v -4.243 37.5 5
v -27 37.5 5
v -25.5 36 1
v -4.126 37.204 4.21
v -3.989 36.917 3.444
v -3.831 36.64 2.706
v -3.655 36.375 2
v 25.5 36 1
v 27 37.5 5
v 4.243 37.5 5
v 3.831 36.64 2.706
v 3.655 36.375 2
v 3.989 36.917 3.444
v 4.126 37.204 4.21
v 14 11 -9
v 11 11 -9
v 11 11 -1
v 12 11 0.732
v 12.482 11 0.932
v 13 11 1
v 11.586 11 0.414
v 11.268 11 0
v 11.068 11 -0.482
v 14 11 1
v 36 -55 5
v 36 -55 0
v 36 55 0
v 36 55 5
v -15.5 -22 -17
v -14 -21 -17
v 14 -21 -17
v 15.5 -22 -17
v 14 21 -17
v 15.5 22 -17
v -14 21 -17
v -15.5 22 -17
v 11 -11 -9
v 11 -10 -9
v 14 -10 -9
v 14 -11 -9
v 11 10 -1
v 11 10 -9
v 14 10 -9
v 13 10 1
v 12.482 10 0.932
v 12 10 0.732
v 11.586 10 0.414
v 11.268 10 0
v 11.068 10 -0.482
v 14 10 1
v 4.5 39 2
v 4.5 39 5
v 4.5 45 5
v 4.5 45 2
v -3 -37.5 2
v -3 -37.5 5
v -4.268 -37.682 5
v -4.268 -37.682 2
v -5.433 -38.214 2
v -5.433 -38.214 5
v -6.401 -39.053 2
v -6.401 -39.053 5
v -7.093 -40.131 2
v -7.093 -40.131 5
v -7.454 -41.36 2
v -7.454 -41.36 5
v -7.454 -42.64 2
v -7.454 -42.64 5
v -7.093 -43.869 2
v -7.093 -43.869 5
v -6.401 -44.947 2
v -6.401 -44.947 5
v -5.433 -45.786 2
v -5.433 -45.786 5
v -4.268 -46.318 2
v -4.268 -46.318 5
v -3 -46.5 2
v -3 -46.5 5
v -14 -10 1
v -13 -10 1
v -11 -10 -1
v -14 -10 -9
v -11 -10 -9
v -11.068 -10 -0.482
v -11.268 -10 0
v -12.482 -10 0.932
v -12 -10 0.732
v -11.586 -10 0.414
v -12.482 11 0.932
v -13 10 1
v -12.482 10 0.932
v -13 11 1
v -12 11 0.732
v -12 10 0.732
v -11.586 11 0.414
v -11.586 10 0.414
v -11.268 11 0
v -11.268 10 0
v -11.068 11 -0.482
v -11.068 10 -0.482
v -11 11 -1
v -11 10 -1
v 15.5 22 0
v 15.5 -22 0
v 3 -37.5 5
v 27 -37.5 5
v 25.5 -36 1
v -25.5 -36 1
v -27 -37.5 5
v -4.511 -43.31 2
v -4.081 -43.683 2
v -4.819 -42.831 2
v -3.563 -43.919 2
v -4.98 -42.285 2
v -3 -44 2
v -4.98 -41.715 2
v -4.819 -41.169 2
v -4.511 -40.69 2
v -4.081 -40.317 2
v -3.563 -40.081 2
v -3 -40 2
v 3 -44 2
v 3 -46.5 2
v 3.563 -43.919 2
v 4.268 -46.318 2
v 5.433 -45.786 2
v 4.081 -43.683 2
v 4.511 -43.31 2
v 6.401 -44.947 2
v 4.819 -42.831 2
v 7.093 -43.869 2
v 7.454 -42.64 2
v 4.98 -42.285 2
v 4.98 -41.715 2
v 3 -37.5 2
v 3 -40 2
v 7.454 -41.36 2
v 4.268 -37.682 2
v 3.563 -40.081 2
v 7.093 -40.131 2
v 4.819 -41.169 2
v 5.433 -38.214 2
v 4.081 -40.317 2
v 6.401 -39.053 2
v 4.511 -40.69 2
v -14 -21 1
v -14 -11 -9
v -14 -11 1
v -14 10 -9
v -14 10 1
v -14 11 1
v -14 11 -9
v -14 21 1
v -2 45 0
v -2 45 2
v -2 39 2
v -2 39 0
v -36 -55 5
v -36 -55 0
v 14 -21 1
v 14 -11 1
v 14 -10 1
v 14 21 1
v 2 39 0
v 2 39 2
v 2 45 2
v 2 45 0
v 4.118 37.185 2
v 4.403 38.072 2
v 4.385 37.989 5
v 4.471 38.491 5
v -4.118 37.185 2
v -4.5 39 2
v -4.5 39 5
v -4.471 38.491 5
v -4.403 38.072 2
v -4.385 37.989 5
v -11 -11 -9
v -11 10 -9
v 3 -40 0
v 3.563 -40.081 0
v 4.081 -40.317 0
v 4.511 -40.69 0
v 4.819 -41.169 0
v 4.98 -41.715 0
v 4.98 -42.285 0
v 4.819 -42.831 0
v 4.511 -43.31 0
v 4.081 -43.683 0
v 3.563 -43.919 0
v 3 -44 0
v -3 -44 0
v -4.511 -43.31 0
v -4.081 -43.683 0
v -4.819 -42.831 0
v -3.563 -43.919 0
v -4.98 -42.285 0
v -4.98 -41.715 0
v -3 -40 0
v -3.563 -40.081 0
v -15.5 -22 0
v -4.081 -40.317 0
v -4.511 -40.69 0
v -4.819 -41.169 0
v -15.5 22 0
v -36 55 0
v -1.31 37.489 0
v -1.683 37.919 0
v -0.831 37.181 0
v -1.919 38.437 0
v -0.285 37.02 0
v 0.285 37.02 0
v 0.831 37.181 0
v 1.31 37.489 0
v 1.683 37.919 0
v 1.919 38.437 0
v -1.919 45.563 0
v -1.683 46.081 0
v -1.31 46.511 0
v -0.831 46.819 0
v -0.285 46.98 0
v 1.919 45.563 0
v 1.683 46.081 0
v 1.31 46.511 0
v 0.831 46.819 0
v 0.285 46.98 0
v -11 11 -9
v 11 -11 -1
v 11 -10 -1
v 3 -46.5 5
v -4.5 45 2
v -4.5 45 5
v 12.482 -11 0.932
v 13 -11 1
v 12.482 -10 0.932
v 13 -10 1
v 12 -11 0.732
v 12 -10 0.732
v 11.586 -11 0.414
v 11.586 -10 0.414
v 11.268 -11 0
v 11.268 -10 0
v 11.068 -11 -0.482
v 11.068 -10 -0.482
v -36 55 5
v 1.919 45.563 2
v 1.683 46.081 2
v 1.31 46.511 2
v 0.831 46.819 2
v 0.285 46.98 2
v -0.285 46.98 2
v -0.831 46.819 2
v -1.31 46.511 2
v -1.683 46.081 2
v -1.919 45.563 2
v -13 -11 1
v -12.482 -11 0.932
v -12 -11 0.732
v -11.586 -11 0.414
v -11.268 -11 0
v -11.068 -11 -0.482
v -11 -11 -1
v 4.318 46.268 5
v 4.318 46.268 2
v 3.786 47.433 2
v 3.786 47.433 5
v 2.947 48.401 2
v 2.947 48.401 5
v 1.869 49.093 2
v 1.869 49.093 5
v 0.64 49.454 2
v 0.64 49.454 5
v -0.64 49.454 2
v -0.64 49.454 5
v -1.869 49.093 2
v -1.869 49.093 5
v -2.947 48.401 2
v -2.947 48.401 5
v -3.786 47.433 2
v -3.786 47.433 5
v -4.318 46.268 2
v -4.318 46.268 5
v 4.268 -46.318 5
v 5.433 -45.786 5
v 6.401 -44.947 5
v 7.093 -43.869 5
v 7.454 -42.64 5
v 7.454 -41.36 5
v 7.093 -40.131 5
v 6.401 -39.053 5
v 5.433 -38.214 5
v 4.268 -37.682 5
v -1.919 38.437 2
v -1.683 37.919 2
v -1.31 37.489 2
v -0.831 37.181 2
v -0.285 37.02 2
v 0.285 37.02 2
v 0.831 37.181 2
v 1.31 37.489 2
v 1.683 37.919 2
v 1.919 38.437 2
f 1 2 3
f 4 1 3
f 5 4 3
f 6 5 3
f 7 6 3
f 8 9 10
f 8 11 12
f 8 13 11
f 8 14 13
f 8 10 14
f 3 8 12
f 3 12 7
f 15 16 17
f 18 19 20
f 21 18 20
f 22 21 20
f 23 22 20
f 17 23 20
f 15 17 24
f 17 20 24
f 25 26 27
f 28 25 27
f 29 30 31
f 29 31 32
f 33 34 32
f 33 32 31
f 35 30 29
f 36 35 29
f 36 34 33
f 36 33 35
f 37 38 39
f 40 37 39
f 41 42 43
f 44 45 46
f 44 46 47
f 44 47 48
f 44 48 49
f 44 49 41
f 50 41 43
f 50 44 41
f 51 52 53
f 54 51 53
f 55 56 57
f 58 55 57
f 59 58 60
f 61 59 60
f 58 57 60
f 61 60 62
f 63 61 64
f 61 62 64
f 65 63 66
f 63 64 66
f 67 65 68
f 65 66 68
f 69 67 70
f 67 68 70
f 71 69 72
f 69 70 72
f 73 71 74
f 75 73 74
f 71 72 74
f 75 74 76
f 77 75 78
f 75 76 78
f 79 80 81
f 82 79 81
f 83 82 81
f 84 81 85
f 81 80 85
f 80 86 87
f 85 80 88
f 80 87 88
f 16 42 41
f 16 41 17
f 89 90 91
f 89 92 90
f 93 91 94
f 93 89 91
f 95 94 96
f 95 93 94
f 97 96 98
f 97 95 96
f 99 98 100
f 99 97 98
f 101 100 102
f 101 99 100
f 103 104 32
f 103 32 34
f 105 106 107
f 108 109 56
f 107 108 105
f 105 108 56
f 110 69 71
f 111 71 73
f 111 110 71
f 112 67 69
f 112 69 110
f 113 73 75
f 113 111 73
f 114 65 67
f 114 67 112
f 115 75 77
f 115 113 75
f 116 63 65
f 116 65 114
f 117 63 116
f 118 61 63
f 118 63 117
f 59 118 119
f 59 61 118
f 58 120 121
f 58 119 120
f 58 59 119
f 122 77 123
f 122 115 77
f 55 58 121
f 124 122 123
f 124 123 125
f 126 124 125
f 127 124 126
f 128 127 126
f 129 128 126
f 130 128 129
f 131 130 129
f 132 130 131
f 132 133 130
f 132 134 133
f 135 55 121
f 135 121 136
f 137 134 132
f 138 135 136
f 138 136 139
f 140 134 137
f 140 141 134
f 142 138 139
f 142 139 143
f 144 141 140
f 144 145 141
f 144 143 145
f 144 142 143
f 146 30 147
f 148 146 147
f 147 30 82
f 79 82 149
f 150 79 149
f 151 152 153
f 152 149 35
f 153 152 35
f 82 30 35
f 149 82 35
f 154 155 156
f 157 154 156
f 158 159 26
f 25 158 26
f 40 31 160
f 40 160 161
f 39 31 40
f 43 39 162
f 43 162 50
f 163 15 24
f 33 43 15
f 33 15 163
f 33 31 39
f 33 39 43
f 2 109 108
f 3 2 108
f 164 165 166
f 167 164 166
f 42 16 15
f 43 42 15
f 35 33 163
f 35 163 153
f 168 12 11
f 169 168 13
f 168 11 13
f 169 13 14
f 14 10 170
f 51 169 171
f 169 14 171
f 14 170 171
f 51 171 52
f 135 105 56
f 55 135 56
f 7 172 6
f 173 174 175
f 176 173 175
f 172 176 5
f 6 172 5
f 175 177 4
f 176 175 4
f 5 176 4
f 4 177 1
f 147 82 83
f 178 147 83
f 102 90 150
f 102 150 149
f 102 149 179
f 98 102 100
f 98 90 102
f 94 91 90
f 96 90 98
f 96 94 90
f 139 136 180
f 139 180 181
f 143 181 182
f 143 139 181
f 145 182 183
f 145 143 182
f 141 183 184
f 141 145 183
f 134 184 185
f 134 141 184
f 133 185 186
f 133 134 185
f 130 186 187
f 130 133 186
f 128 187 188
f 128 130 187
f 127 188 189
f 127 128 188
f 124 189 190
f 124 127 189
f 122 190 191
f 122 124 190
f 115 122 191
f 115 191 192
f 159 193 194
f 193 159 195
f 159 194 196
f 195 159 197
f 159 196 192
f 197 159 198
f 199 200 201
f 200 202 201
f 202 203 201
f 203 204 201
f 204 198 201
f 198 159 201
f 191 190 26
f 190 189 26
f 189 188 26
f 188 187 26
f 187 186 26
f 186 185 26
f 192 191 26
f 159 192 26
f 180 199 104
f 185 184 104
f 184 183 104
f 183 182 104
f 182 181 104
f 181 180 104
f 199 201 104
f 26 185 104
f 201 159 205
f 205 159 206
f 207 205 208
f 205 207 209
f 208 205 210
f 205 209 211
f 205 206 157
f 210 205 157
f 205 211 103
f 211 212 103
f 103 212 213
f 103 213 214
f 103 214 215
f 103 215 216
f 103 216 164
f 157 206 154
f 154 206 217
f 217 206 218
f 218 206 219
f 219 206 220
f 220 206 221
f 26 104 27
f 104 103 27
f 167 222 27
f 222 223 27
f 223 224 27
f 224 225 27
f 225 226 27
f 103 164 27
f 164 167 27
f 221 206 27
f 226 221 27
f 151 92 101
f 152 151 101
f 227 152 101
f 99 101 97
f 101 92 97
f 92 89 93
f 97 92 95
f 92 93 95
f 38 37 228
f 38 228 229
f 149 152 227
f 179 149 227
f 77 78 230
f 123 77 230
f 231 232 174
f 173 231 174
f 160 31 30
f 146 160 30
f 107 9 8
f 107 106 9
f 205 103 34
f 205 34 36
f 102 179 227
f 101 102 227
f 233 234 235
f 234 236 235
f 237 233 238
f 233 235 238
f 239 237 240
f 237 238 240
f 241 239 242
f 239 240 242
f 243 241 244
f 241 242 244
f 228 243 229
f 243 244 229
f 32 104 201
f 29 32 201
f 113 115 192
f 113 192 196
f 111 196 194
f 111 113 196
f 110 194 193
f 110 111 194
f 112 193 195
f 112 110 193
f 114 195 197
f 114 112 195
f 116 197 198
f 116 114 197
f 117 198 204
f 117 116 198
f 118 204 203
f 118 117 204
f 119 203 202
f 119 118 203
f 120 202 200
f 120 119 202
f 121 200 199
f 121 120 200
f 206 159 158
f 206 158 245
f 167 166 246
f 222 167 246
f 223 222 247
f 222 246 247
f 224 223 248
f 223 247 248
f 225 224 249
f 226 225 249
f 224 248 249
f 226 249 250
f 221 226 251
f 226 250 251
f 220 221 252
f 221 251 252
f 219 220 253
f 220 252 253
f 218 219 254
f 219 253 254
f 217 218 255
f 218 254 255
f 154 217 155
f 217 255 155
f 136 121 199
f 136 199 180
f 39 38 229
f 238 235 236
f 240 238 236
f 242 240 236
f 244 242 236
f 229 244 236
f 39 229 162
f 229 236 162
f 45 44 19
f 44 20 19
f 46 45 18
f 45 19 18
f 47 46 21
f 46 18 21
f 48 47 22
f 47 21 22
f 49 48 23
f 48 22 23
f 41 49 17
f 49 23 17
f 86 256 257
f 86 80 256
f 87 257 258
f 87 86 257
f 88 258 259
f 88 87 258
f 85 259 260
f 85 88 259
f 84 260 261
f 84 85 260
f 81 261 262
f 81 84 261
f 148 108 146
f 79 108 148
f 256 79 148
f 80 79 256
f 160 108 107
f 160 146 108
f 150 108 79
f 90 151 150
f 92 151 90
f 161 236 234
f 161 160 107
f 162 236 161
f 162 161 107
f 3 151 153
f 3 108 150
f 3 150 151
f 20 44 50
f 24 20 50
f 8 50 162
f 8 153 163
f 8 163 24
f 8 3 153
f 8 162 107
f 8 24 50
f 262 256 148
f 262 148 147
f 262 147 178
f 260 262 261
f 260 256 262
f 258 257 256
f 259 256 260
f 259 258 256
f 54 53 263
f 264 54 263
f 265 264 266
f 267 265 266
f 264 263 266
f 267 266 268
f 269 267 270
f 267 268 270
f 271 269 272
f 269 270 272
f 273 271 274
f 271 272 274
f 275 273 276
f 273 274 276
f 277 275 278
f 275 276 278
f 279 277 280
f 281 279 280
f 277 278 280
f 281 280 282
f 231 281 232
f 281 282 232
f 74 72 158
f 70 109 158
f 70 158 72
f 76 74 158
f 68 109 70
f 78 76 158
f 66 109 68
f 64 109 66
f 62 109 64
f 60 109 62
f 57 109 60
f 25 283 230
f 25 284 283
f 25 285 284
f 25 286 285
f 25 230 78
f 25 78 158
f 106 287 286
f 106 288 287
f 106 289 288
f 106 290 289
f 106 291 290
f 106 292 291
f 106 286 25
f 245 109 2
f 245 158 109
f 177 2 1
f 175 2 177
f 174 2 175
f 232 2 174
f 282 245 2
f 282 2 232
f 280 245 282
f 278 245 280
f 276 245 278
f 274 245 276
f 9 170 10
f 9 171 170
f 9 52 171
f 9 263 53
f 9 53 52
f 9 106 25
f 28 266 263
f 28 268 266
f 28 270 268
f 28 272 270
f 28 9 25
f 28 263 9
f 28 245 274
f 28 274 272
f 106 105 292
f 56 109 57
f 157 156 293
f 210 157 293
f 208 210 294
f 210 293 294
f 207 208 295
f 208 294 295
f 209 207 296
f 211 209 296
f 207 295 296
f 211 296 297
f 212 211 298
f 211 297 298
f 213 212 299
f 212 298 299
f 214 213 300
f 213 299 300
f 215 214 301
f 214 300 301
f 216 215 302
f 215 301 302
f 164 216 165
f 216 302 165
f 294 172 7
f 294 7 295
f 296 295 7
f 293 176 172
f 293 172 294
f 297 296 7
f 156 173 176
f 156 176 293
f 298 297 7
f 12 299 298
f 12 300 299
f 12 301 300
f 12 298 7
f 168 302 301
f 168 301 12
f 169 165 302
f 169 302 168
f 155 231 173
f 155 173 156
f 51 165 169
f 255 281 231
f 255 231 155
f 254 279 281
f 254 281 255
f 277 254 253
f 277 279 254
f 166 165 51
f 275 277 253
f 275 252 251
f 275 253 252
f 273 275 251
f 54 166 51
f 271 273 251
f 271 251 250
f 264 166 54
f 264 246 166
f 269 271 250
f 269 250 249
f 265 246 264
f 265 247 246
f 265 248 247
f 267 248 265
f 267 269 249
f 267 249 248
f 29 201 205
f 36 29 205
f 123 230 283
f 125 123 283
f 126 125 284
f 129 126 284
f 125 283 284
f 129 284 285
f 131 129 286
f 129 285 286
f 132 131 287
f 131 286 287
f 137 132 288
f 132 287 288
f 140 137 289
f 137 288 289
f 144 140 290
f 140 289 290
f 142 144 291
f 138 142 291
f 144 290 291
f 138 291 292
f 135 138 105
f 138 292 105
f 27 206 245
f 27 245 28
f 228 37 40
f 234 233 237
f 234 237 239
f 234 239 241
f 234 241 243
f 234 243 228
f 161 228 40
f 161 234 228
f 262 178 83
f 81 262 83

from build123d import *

# Parameters (mm, degrees)
ESBO_O1_W                = 72
ESBO_O1_H                = 110
RESSALTO_EXTRUS_O1_DEPTH = 5
ESBO_O2_W                = 51
ESBO_O2_H                = 72
CORTE_EXTRUS_O1_DEPTH    = 4
CHANFRO1_SIZE            = 1.5
CHANFRO1_SIZE_2          = 4
CORTE_EXTRUS_O2_DEPTH    = 66.924198895
CORTE_EXTRUS_O3_DEPTH    = 66.924198895
CORTE_EXTRUS_O4_DEPTH    = 3
CORTE_EXTRUS_O5_DEPTH    = 3
ESBO_O7_W                = 31
ESBO_O7_H                = 44
RESSALTO_EXTRUS_O2_DEPTH = 17
ESBO_O8_W                = 28
ESBO_O8_H                = 42
CORTE_EXTRUS_O6_DEPTH    = 70.318107302
ESBO_O9_W                = 3
ESBO_O9_H                = 1
RESSALTO_EXTRUS_O3_DEPTH = 10
FILETE1_R                = 2


with BuildPart() as part:
    # Esboço1 → Ressalto-extrusão1 (new body)
    with BuildSketch(Plane.XY):
        Rectangle(ESBO_O1_W, ESBO_O1_H)
    extrude(amount=RESSALTO_EXTRUS_O1_DEPTH)

    # Esboço2 → Corte-extrusão1 (cut)
    with BuildSketch(Plane.XY.offset(5)):
        Rectangle(ESBO_O2_W, ESBO_O2_H)
    extrude(amount=-CORTE_EXTRUS_O1_DEPTH, mode=Mode.SUBTRACT)

    # Chanfro1
    # the kernel refuses this chamfer: 4, 1.5 mm, written as the material it takes off along each edge
    with BuildSketch(Plane(origin=(-25.5, -36, 5), x_dir=(0, -0.9953980532473654, 0.09582648689874358), z_dir=(1, 0, 0))) as chanfro1_piece_1_section:
        Polygon((CHANFRO1_SIZE * 0.995398053247, CHANFRO1_SIZE * 0.0958264868987), (-CHANFRO1_SIZE_2 * 0.0958264868987, CHANFRO1_SIZE_2 * 0.995398053247), (0, 0), align=None)
    chanfro1_piece_1 = extrude(amount=51, mode=Mode.PRIVATE)
    chanfro1_piece_1 = split(chanfro1_piece_1, bisect_by=Plane(origin=(0, -36.465264147, 1), z_dir=(0, 0, 1)), keep=Keep.TOP, mode=Mode.PRIVATE)
    add(chanfro1_piece_1, mode=Mode.SUBTRACT)
    with BuildSketch(Plane(origin=(-25.5, 36, 5), x_dir=(-0.9953980532473654, 0, 0.09582648689874379), z_dir=(0, -1, 0))) as chanfro1_piece_2_section:
        Polygon((CHANFRO1_SIZE * 0.995398053247, CHANFRO1_SIZE * 0.0958264868987), (-CHANFRO1_SIZE_2 * 0.0958264868987, CHANFRO1_SIZE_2 * 0.995398053247), (0, 0), align=None)
    chanfro1_piece_2 = extrude(amount=72, mode=Mode.PRIVATE)
    chanfro1_piece_2 = split(chanfro1_piece_2, bisect_by=Plane(origin=(-25.965264147, 0, 1), z_dir=(0, 0, 1)), keep=Keep.TOP, mode=Mode.PRIVATE)
    add(chanfro1_piece_2, mode=Mode.SUBTRACT)
    with BuildSketch(Plane(origin=(25.5, -36, 5), x_dir=(0.9953980532473654, 0, 0.09582648689874379), z_dir=(0, 1, 0))) as chanfro1_piece_3_section:
        Polygon((CHANFRO1_SIZE * 0.995398053247, CHANFRO1_SIZE * 0.0958264868987), (-CHANFRO1_SIZE_2 * 0.0958264868987, CHANFRO1_SIZE_2 * 0.995398053247), (0, 0), align=None)
    chanfro1_piece_3 = extrude(amount=72, mode=Mode.PRIVATE)
    chanfro1_piece_3 = split(chanfro1_piece_3, bisect_by=Plane(origin=(25.965264147, 0, 1), z_dir=(0, 0, 1)), keep=Keep.TOP, mode=Mode.PRIVATE)
    add(chanfro1_piece_3, mode=Mode.SUBTRACT)
    with BuildSketch(Plane(origin=(25.5, 36, 5), x_dir=(0, 0.9953980532473654, 0.09582648689874358), z_dir=(-1, 0, 0))) as chanfro1_piece_4_section:
        Polygon((CHANFRO1_SIZE * 0.995398053247, CHANFRO1_SIZE * 0.0958264868987), (-CHANFRO1_SIZE_2 * 0.0958264868987, CHANFRO1_SIZE_2 * 0.995398053247), (0, 0), align=None)
    chanfro1_piece_4 = extrude(amount=51, mode=Mode.PRIVATE)
    chanfro1_piece_4 = split(chanfro1_piece_4, bisect_by=Plane(origin=(0, 36.465264147, 1), z_dir=(0, 0, 1)), keep=Keep.TOP, mode=Mode.PRIVATE)
    add(chanfro1_piece_4, mode=Mode.SUBTRACT)
    with BuildSketch(Plane(origin=(-35.875482322, -36, 5), x_dir=(0, -0.9953980532473654, 0.09582648689874358), z_dir=(1, 0, 0))) as chanfro1_piece_5a_section:
        Polygon((CHANFRO1_SIZE * 0.995398053247, CHANFRO1_SIZE * 0.0958264868987), (-CHANFRO1_SIZE_2 * 0.0958264868987, CHANFRO1_SIZE_2 * 0.995398053247), (0, 0), align=None)
    chanfro1_piece_5a = extrude(amount=61.375482322, mode=Mode.PRIVATE)
    chanfro1_piece_5a = split(chanfro1_piece_5a, bisect_by=Plane(origin=(-25.5, -36.465264147, 3.645492171), z_dir=(-1, 0, 0)), keep=Keep.TOP, mode=Mode.PRIVATE)
    chanfro1_piece_5a = split(chanfro1_piece_5a, bisect_by=Plane(origin=(-30.687741161, -36.465264147, 1), z_dir=(0, 0, 1)), keep=Keep.TOP, mode=Mode.PRIVATE)
    with BuildSketch(Plane(origin=(-25.5, 36, 5), x_dir=(-0.9953980532473654, 0, 0.09582648689874379), z_dir=(0, -1, 0))) as chanfro1_piece_5b_section:
        Polygon((CHANFRO1_SIZE * 0.995398053247, CHANFRO1_SIZE * 0.0958264868987), (-CHANFRO1_SIZE_2 * 0.0958264868987, CHANFRO1_SIZE_2 * 0.995398053247), (0, 0), align=None)
    chanfro1_piece_5b = extrude(amount=82.375482322, mode=Mode.PRIVATE)
    chanfro1_piece_5b = split(chanfro1_piece_5b, bisect_by=Plane(origin=(-25.965264147, -36, 3.645492171), z_dir=(0, -1, 0)), keep=Keep.TOP, mode=Mode.PRIVATE)
    chanfro1_piece_5b = split(chanfro1_piece_5b, bisect_by=Plane(origin=(-25.965264147, -41.187741161, 1), z_dir=(0, 0, 1)), keep=Keep.TOP, mode=Mode.PRIVATE)
    chanfro1_piece_5 = chanfro1_piece_5a & chanfro1_piece_5b
    add(chanfro1_piece_5, mode=Mode.SUBTRACT)
    with BuildSketch(Plane(origin=(-25.5, -36, 5), x_dir=(0, -0.9953980532473654, 0.09582648689874358), z_dir=(1, 0, 0))) as chanfro1_piece_6a_section:
        Polygon((CHANFRO1_SIZE * 0.995398053247, CHANFRO1_SIZE * 0.0958264868987), (-CHANFRO1_SIZE_2 * 0.0958264868987, CHANFRO1_SIZE_2 * 0.995398053247), (0, 0), align=None)
    chanfro1_piece_6a = extrude(amount=61.375482322, mode=Mode.PRIVATE)
    chanfro1_piece_6a = split(chanfro1_piece_6a, bisect_by=Plane(origin=(25.5, -36.465264147, 3.645492171), z_dir=(1, 0, 0)), keep=Keep.TOP, mode=Mode.PRIVATE)
    chanfro1_piece_6a = split(chanfro1_piece_6a, bisect_by=Plane(origin=(30.687741161, -36.465264147, 1), z_dir=(0, 0, 1)), keep=Keep.TOP, mode=Mode.PRIVATE)
    with BuildSketch(Plane(origin=(25.5, -46.375482322, 5), x_dir=(0.9953980532473654, 0, 0.09582648689874379), z_dir=(0, 1, 0))) as chanfro1_piece_6b_section:
        Polygon((CHANFRO1_SIZE * 0.995398053247, CHANFRO1_SIZE * 0.0958264868987), (-CHANFRO1_SIZE_2 * 0.0958264868987, CHANFRO1_SIZE_2 * 0.995398053247), (0, 0), align=None)
    chanfro1_piece_6b = extrude(amount=82.375482322, mode=Mode.PRIVATE)
    chanfro1_piece_6b = split(chanfro1_piece_6b, bisect_by=Plane(origin=(25.965264147, -36, 3.645492171), z_dir=(0, -1, 0)), keep=Keep.TOP, mode=Mode.PRIVATE)
    chanfro1_piece_6b = split(chanfro1_piece_6b, bisect_by=Plane(origin=(25.965264147, -41.187741161, 1), z_dir=(0, 0, 1)), keep=Keep.TOP, mode=Mode.PRIVATE)
    chanfro1_piece_6 = chanfro1_piece_6a & chanfro1_piece_6b
    add(chanfro1_piece_6, mode=Mode.SUBTRACT)
    with BuildSketch(Plane(origin=(25.5, 36, 5), x_dir=(0, 0.9953980532473654, 0.09582648689874358), z_dir=(-1, 0, 0))) as chanfro1_piece_7a_section:
        Polygon((CHANFRO1_SIZE * 0.995398053247, CHANFRO1_SIZE * 0.0958264868987), (-CHANFRO1_SIZE_2 * 0.0958264868987, CHANFRO1_SIZE_2 * 0.995398053247), (0, 0), align=None)
    chanfro1_piece_7a = extrude(amount=61.375482322, mode=Mode.PRIVATE)
    chanfro1_piece_7a = split(chanfro1_piece_7a, bisect_by=Plane(origin=(-25.5, 36.465264147, 3.645492171), z_dir=(-1, 0, 0)), keep=Keep.TOP, mode=Mode.PRIVATE)
    chanfro1_piece_7a = split(chanfro1_piece_7a, bisect_by=Plane(origin=(-30.687741161, 36.465264147, 1), z_dir=(0, 0, 1)), keep=Keep.TOP, mode=Mode.PRIVATE)
    with BuildSketch(Plane(origin=(-25.5, 46.375482322, 5), x_dir=(-0.9953980532473654, 0, 0.09582648689874379), z_dir=(0, -1, 0))) as chanfro1_piece_7b_section:
        Polygon((CHANFRO1_SIZE * 0.995398053247, CHANFRO1_SIZE * 0.0958264868987), (-CHANFRO1_SIZE_2 * 0.0958264868987, CHANFRO1_SIZE_2 * 0.995398053247), (0, 0), align=None)
    chanfro1_piece_7b = extrude(amount=82.375482322, mode=Mode.PRIVATE)
    chanfro1_piece_7b = split(chanfro1_piece_7b, bisect_by=Plane(origin=(-25.965264147, 36, 3.645492171), z_dir=(0, 1, 0)), keep=Keep.TOP, mode=Mode.PRIVATE)
    chanfro1_piece_7b = split(chanfro1_piece_7b, bisect_by=Plane(origin=(-25.965264147, 41.187741161, 1), z_dir=(0, 0, 1)), keep=Keep.TOP, mode=Mode.PRIVATE)
    chanfro1_piece_7 = chanfro1_piece_7a & chanfro1_piece_7b
    add(chanfro1_piece_7, mode=Mode.SUBTRACT)
    with BuildSketch(Plane(origin=(25.5, -36, 5), x_dir=(0.9953980532473654, 0, 0.09582648689874379), z_dir=(0, 1, 0))) as chanfro1_piece_8a_section:
        Polygon((CHANFRO1_SIZE * 0.995398053247, CHANFRO1_SIZE * 0.0958264868987), (-CHANFRO1_SIZE_2 * 0.0958264868987, CHANFRO1_SIZE_2 * 0.995398053247), (0, 0), align=None)
    chanfro1_piece_8a = extrude(amount=82.375482322, mode=Mode.PRIVATE)
    chanfro1_piece_8a = split(chanfro1_piece_8a, bisect_by=Plane(origin=(25.965264147, 36, 3.645492171), z_dir=(0, 1, 0)), keep=Keep.TOP, mode=Mode.PRIVATE)
    chanfro1_piece_8a = split(chanfro1_piece_8a, bisect_by=Plane(origin=(25.965264147, 41.187741161, 1), z_dir=(0, 0, 1)), keep=Keep.TOP, mode=Mode.PRIVATE)
    with BuildSketch(Plane(origin=(35.875482322, 36, 5), x_dir=(0, 0.9953980532473654, 0.09582648689874358), z_dir=(-1, 0, 0))) as chanfro1_piece_8b_section:
        Polygon((CHANFRO1_SIZE * 0.995398053247, CHANFRO1_SIZE * 0.0958264868987), (-CHANFRO1_SIZE_2 * 0.0958264868987, CHANFRO1_SIZE_2 * 0.995398053247), (0, 0), align=None)
    chanfro1_piece_8b = extrude(amount=61.375482322, mode=Mode.PRIVATE)
    chanfro1_piece_8b = split(chanfro1_piece_8b, bisect_by=Plane(origin=(25.5, 36.465264147, 3.645492171), z_dir=(1, 0, 0)), keep=Keep.TOP, mode=Mode.PRIVATE)
    chanfro1_piece_8b = split(chanfro1_piece_8b, bisect_by=Plane(origin=(30.687741161, 36.465264147, 1), z_dir=(0, 0, 1)), keep=Keep.TOP, mode=Mode.PRIVATE)
    chanfro1_piece_8 = chanfro1_piece_8a & chanfro1_piece_8b
    add(chanfro1_piece_8, mode=Mode.SUBTRACT)

    # Esboço3 → Corte-extrusão2 (cut, through all)
    with BuildSketch(Plane.XY.offset(5)):
        with BuildLine():
            Line((-2, 45), (-2, 39))
            ThreePointArc((-2, 39), (0, 37), (2, 39))
            Line((2, 39), (2, 45))
            ThreePointArc((2, 45), (0, 47), (-2, 45))
        make_face()
    extrude(amount=-CORTE_EXTRUS_O2_DEPTH, mode=Mode.SUBTRACT)

    # Esboço4 → Corte-extrusão3 (cut, through all)
    with BuildSketch(Plane.XY.offset(5)):
        with BuildLine():
            Line((-3, -40), (3, -40))
            ThreePointArc((3, -40), (5, -42), (3, -44))
            Line((3, -44), (-3, -44))
            ThreePointArc((-3, -44), (-5, -42), (-3, -40))
        make_face()
    extrude(amount=-CORTE_EXTRUS_O3_DEPTH, mode=Mode.SUBTRACT)

    # Esboço5 → Corte-extrusão4 (cut)
    with BuildSketch(Plane.XY.offset(5)):
        with BuildLine():
            Line((4.5, 39), (4.5, 45))
            ThreePointArc((4.5, 45), (0, 49.5), (-4.5, 45))
            Line((-4.5, 45), (-4.5, 39))
            ThreePointArc((-4.5, 39), (-4.101470225, 37.148529775), (-2.976470225, 35.625))
            ThreePointArc((-2.976470225, 35.625), (0, 34.5), (2.976470225, 35.625))
            ThreePointArc((2.976470225, 35.625), (4.101470225, 37.148529775), (4.5, 39))
        make_face()
    extrude(amount=-CORTE_EXTRUS_O4_DEPTH, mode=Mode.SUBTRACT)

    # Esboço6 → Corte-extrusão5 (cut)
    with BuildSketch(Plane.XY.offset(5)):
        with BuildLine():
            Line((-3, -46.5), (3, -46.5))
            ThreePointArc((3, -46.5), (7.5, -42), (3, -37.5))
            Line((3, -37.5), (-3, -37.5))
            ThreePointArc((-3, -37.5), (-7.5, -42), (-3, -46.5))
        make_face()
    extrude(amount=-CORTE_EXTRUS_O5_DEPTH, mode=Mode.SUBTRACT)

    # Esboço7 → Ressalto-extrusão2 (add)
    with BuildSketch(Plane(origin=(0, 0, 0), x_dir=(-1, 0, 0), z_dir=(0, 0, -1))):
        Rectangle(ESBO_O7_W, ESBO_O7_H)
    extrude(amount=RESSALTO_EXTRUS_O2_DEPTH)

    # Esboço8 → Corte-extrusão6 (cut, through all)
    with BuildSketch(Plane(origin=(0, 0, -17), x_dir=(-1, 0, 0), z_dir=(0, 0, -1))):
        Rectangle(ESBO_O8_W, ESBO_O8_H)
    extrude(amount=-CORTE_EXTRUS_O6_DEPTH, mode=Mode.SUBTRACT)

    # Esboço9 → Ressalto-extrusão3 (add)
    with BuildSketch(Plane.XY.offset(1)):
        with Locations((-12.5, 10.5)):
            Rectangle(ESBO_O9_W, ESBO_O9_H)
        with Locations((12.5, 10.5)):
            Rectangle(ESBO_O9_W, ESBO_O9_H)
        with Locations((12.5, -10.5)):
            Rectangle(ESBO_O9_W, ESBO_O9_H)
        with Locations((-12.5, -10.5)):
            Rectangle(ESBO_O9_W, ESBO_O9_H)
    extrude(amount=-RESSALTO_EXTRUS_O3_DEPTH)

    # Filete1
    filete1_edges = [part.edges().sort_by_distance(p)[0] for p in [
        (-11, 10.5, 1),
        (11, 10.5, 1),
        (11, -10.5, 1),
        (-11, -10.5, 1),
    ]]
    fillet(filete1_edges, radius=FILETE1_R)


solid = part.part
